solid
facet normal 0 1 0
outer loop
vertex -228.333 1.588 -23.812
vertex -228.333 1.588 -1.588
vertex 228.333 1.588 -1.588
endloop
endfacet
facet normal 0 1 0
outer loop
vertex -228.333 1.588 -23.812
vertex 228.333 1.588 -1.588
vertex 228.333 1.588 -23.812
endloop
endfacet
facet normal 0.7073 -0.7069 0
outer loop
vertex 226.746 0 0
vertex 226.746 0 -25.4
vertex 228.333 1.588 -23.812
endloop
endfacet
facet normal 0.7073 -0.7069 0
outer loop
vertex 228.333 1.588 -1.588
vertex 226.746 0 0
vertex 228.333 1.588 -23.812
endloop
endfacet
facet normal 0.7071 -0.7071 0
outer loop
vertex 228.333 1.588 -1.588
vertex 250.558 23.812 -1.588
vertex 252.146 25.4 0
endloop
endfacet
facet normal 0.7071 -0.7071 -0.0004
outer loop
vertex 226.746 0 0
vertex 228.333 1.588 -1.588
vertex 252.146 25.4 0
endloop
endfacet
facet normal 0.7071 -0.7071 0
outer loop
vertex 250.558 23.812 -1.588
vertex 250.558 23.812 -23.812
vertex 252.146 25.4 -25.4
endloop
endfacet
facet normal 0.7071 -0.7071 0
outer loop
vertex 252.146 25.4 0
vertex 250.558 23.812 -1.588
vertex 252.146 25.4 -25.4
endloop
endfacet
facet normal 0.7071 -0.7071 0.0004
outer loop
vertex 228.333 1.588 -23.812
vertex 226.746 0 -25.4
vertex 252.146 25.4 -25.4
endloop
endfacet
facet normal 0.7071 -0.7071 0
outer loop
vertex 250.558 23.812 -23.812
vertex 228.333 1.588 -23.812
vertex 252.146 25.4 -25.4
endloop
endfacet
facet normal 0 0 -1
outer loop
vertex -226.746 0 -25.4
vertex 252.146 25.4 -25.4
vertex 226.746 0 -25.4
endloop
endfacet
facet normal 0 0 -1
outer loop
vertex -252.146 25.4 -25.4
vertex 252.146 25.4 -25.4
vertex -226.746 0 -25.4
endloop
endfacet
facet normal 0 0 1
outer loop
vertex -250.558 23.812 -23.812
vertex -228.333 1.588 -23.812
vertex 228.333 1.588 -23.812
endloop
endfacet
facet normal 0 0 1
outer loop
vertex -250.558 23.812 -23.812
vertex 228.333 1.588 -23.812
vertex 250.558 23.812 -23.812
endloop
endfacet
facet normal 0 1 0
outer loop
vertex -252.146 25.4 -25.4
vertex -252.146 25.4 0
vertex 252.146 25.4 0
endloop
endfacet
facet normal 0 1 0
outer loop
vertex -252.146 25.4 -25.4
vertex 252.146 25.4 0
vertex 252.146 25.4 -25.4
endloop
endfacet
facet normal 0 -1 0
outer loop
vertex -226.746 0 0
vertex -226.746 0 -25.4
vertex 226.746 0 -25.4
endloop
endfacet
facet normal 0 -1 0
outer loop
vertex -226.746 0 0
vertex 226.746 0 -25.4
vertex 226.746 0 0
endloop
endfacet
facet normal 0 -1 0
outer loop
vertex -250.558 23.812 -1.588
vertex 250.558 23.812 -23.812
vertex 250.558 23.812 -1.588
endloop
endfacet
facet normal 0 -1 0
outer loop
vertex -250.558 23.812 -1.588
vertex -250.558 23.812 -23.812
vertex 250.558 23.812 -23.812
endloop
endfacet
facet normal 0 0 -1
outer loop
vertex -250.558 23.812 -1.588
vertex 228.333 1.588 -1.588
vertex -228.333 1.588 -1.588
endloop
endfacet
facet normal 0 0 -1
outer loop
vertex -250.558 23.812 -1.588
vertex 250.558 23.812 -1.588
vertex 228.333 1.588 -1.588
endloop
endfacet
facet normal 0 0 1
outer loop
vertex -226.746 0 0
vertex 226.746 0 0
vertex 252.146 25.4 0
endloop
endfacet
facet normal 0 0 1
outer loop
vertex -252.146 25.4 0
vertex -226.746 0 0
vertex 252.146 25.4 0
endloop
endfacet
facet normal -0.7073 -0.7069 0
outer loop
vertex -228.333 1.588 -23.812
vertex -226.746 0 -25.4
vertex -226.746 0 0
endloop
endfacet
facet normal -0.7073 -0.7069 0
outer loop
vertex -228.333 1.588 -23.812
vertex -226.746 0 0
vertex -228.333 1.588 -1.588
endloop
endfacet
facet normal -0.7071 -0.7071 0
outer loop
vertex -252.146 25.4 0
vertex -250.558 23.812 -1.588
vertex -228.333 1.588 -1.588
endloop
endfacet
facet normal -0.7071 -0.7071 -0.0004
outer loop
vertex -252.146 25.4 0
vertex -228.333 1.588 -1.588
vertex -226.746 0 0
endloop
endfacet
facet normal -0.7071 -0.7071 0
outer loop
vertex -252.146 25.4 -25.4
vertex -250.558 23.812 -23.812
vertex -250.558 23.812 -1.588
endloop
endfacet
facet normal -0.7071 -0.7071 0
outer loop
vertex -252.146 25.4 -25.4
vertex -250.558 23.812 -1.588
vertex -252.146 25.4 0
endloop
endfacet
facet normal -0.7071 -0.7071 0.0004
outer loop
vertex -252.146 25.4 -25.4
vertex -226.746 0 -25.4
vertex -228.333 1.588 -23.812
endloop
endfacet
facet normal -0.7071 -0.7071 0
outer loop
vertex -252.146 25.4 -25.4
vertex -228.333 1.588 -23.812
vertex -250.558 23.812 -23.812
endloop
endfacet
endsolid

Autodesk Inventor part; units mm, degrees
ref_plane "YZ Plane" through (0, 0, 0) normal (1, 0, 0) x (0, 1, 0)
ref_plane "XZ Plane" through (0, 0, 0) normal (0, 1, 0) x (-1, 0, 0)
ref_plane "XY Plane" through (0, 0, 0) normal (0, 0, 1) x (1, 0, 0)
sketch "Sketch1" plane through (0, 0, 0) normal (1, 0, 0) x (0, 1, 0)
  line L0 (0, 0) -> (25.4, 0)
  line L1 (25.4, 0) -> (25.4, -25.4)
  line L2 (25.4, -25.4) -> (0, -25.4)
  line L3 (0, -25.4) -> (0, 0)
  line L4 (23.8125, -1.5875) -> (1.5875, -1.5875)
  line L5 (1.5875, -1.5875) -> (1.5875, -23.8125)
  line L6 (1.5875, -23.8125) -> (23.8125, -23.8125)
  line L7 (23.8125, -23.8125) -> (23.8125, -1.5875)
  dimension "d0" = 25.4
  dimension "d1" = 25.4
  dimension "d2" = 1.5875
extrude "Extrusion1" add sketch "Sketch1" along normal mid plane 504.2916
chamfer "Chamfer1" distance 25.4 angle 45 1 edges at (252.1458, 0, -12.7)
chamfer "Chamfer2" distance 25.4 angle 45 1 edges at (-252.1458, 0, -12.7)
properties part number "SUP_004_TopConnectorBar" material "Aluminum 6061"
